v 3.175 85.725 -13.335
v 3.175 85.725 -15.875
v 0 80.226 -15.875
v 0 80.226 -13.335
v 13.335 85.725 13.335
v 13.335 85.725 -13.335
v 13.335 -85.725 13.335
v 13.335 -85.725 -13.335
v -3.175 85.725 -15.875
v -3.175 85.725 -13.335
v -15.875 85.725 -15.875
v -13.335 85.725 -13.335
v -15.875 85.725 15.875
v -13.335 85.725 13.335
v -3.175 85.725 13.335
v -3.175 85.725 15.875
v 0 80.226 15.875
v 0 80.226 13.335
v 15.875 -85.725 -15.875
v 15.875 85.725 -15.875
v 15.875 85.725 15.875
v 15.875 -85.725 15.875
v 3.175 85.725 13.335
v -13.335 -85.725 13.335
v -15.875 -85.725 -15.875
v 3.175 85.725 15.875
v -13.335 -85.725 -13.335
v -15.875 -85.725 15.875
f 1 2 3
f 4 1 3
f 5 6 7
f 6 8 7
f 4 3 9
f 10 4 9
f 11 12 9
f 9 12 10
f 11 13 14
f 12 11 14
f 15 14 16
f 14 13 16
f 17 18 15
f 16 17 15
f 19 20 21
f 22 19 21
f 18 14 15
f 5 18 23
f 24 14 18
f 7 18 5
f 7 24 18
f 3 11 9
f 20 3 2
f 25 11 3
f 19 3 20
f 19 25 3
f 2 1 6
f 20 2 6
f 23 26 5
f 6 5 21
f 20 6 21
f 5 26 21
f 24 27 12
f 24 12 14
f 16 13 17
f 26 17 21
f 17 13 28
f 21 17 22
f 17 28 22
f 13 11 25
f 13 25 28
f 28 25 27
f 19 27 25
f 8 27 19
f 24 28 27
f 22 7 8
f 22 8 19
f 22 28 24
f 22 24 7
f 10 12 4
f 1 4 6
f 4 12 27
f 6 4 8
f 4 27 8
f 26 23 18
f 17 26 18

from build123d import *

# Parameters (mm, degrees)
F0_W     = 31.75
F0_H     = 31.75
F0_W_2   = 26.67
F0_H_2   = 26.67
F1_DEPTH = 85.725
F3_DEPTH = 31.75


with BuildPart() as f1:
    # F0 (on Front) → F1 (new body, symmetric)
    with BuildSketch(Plane.XZ):
        Rectangle(F0_W, F0_H)
        Rectangle(F0_W_2, F0_H_2, mode=Mode.SUBTRACT)
    extrude(amount=F1_DEPTH, both=True)

    # F2 (on face) → F3 (cut, through all)
    with BuildSketch(Plane(origin=(0, 0, -15.875), x_dir=(1, 0, 0), z_dir=(0, 0, -1))):
        Polygon((0, -80.225739), (-3.175, -85.725), (3.175, -85.725), align=None)
    extrude(amount=-F3_DEPTH, mode=Mode.SUBTRACT)


solid = f1.part
